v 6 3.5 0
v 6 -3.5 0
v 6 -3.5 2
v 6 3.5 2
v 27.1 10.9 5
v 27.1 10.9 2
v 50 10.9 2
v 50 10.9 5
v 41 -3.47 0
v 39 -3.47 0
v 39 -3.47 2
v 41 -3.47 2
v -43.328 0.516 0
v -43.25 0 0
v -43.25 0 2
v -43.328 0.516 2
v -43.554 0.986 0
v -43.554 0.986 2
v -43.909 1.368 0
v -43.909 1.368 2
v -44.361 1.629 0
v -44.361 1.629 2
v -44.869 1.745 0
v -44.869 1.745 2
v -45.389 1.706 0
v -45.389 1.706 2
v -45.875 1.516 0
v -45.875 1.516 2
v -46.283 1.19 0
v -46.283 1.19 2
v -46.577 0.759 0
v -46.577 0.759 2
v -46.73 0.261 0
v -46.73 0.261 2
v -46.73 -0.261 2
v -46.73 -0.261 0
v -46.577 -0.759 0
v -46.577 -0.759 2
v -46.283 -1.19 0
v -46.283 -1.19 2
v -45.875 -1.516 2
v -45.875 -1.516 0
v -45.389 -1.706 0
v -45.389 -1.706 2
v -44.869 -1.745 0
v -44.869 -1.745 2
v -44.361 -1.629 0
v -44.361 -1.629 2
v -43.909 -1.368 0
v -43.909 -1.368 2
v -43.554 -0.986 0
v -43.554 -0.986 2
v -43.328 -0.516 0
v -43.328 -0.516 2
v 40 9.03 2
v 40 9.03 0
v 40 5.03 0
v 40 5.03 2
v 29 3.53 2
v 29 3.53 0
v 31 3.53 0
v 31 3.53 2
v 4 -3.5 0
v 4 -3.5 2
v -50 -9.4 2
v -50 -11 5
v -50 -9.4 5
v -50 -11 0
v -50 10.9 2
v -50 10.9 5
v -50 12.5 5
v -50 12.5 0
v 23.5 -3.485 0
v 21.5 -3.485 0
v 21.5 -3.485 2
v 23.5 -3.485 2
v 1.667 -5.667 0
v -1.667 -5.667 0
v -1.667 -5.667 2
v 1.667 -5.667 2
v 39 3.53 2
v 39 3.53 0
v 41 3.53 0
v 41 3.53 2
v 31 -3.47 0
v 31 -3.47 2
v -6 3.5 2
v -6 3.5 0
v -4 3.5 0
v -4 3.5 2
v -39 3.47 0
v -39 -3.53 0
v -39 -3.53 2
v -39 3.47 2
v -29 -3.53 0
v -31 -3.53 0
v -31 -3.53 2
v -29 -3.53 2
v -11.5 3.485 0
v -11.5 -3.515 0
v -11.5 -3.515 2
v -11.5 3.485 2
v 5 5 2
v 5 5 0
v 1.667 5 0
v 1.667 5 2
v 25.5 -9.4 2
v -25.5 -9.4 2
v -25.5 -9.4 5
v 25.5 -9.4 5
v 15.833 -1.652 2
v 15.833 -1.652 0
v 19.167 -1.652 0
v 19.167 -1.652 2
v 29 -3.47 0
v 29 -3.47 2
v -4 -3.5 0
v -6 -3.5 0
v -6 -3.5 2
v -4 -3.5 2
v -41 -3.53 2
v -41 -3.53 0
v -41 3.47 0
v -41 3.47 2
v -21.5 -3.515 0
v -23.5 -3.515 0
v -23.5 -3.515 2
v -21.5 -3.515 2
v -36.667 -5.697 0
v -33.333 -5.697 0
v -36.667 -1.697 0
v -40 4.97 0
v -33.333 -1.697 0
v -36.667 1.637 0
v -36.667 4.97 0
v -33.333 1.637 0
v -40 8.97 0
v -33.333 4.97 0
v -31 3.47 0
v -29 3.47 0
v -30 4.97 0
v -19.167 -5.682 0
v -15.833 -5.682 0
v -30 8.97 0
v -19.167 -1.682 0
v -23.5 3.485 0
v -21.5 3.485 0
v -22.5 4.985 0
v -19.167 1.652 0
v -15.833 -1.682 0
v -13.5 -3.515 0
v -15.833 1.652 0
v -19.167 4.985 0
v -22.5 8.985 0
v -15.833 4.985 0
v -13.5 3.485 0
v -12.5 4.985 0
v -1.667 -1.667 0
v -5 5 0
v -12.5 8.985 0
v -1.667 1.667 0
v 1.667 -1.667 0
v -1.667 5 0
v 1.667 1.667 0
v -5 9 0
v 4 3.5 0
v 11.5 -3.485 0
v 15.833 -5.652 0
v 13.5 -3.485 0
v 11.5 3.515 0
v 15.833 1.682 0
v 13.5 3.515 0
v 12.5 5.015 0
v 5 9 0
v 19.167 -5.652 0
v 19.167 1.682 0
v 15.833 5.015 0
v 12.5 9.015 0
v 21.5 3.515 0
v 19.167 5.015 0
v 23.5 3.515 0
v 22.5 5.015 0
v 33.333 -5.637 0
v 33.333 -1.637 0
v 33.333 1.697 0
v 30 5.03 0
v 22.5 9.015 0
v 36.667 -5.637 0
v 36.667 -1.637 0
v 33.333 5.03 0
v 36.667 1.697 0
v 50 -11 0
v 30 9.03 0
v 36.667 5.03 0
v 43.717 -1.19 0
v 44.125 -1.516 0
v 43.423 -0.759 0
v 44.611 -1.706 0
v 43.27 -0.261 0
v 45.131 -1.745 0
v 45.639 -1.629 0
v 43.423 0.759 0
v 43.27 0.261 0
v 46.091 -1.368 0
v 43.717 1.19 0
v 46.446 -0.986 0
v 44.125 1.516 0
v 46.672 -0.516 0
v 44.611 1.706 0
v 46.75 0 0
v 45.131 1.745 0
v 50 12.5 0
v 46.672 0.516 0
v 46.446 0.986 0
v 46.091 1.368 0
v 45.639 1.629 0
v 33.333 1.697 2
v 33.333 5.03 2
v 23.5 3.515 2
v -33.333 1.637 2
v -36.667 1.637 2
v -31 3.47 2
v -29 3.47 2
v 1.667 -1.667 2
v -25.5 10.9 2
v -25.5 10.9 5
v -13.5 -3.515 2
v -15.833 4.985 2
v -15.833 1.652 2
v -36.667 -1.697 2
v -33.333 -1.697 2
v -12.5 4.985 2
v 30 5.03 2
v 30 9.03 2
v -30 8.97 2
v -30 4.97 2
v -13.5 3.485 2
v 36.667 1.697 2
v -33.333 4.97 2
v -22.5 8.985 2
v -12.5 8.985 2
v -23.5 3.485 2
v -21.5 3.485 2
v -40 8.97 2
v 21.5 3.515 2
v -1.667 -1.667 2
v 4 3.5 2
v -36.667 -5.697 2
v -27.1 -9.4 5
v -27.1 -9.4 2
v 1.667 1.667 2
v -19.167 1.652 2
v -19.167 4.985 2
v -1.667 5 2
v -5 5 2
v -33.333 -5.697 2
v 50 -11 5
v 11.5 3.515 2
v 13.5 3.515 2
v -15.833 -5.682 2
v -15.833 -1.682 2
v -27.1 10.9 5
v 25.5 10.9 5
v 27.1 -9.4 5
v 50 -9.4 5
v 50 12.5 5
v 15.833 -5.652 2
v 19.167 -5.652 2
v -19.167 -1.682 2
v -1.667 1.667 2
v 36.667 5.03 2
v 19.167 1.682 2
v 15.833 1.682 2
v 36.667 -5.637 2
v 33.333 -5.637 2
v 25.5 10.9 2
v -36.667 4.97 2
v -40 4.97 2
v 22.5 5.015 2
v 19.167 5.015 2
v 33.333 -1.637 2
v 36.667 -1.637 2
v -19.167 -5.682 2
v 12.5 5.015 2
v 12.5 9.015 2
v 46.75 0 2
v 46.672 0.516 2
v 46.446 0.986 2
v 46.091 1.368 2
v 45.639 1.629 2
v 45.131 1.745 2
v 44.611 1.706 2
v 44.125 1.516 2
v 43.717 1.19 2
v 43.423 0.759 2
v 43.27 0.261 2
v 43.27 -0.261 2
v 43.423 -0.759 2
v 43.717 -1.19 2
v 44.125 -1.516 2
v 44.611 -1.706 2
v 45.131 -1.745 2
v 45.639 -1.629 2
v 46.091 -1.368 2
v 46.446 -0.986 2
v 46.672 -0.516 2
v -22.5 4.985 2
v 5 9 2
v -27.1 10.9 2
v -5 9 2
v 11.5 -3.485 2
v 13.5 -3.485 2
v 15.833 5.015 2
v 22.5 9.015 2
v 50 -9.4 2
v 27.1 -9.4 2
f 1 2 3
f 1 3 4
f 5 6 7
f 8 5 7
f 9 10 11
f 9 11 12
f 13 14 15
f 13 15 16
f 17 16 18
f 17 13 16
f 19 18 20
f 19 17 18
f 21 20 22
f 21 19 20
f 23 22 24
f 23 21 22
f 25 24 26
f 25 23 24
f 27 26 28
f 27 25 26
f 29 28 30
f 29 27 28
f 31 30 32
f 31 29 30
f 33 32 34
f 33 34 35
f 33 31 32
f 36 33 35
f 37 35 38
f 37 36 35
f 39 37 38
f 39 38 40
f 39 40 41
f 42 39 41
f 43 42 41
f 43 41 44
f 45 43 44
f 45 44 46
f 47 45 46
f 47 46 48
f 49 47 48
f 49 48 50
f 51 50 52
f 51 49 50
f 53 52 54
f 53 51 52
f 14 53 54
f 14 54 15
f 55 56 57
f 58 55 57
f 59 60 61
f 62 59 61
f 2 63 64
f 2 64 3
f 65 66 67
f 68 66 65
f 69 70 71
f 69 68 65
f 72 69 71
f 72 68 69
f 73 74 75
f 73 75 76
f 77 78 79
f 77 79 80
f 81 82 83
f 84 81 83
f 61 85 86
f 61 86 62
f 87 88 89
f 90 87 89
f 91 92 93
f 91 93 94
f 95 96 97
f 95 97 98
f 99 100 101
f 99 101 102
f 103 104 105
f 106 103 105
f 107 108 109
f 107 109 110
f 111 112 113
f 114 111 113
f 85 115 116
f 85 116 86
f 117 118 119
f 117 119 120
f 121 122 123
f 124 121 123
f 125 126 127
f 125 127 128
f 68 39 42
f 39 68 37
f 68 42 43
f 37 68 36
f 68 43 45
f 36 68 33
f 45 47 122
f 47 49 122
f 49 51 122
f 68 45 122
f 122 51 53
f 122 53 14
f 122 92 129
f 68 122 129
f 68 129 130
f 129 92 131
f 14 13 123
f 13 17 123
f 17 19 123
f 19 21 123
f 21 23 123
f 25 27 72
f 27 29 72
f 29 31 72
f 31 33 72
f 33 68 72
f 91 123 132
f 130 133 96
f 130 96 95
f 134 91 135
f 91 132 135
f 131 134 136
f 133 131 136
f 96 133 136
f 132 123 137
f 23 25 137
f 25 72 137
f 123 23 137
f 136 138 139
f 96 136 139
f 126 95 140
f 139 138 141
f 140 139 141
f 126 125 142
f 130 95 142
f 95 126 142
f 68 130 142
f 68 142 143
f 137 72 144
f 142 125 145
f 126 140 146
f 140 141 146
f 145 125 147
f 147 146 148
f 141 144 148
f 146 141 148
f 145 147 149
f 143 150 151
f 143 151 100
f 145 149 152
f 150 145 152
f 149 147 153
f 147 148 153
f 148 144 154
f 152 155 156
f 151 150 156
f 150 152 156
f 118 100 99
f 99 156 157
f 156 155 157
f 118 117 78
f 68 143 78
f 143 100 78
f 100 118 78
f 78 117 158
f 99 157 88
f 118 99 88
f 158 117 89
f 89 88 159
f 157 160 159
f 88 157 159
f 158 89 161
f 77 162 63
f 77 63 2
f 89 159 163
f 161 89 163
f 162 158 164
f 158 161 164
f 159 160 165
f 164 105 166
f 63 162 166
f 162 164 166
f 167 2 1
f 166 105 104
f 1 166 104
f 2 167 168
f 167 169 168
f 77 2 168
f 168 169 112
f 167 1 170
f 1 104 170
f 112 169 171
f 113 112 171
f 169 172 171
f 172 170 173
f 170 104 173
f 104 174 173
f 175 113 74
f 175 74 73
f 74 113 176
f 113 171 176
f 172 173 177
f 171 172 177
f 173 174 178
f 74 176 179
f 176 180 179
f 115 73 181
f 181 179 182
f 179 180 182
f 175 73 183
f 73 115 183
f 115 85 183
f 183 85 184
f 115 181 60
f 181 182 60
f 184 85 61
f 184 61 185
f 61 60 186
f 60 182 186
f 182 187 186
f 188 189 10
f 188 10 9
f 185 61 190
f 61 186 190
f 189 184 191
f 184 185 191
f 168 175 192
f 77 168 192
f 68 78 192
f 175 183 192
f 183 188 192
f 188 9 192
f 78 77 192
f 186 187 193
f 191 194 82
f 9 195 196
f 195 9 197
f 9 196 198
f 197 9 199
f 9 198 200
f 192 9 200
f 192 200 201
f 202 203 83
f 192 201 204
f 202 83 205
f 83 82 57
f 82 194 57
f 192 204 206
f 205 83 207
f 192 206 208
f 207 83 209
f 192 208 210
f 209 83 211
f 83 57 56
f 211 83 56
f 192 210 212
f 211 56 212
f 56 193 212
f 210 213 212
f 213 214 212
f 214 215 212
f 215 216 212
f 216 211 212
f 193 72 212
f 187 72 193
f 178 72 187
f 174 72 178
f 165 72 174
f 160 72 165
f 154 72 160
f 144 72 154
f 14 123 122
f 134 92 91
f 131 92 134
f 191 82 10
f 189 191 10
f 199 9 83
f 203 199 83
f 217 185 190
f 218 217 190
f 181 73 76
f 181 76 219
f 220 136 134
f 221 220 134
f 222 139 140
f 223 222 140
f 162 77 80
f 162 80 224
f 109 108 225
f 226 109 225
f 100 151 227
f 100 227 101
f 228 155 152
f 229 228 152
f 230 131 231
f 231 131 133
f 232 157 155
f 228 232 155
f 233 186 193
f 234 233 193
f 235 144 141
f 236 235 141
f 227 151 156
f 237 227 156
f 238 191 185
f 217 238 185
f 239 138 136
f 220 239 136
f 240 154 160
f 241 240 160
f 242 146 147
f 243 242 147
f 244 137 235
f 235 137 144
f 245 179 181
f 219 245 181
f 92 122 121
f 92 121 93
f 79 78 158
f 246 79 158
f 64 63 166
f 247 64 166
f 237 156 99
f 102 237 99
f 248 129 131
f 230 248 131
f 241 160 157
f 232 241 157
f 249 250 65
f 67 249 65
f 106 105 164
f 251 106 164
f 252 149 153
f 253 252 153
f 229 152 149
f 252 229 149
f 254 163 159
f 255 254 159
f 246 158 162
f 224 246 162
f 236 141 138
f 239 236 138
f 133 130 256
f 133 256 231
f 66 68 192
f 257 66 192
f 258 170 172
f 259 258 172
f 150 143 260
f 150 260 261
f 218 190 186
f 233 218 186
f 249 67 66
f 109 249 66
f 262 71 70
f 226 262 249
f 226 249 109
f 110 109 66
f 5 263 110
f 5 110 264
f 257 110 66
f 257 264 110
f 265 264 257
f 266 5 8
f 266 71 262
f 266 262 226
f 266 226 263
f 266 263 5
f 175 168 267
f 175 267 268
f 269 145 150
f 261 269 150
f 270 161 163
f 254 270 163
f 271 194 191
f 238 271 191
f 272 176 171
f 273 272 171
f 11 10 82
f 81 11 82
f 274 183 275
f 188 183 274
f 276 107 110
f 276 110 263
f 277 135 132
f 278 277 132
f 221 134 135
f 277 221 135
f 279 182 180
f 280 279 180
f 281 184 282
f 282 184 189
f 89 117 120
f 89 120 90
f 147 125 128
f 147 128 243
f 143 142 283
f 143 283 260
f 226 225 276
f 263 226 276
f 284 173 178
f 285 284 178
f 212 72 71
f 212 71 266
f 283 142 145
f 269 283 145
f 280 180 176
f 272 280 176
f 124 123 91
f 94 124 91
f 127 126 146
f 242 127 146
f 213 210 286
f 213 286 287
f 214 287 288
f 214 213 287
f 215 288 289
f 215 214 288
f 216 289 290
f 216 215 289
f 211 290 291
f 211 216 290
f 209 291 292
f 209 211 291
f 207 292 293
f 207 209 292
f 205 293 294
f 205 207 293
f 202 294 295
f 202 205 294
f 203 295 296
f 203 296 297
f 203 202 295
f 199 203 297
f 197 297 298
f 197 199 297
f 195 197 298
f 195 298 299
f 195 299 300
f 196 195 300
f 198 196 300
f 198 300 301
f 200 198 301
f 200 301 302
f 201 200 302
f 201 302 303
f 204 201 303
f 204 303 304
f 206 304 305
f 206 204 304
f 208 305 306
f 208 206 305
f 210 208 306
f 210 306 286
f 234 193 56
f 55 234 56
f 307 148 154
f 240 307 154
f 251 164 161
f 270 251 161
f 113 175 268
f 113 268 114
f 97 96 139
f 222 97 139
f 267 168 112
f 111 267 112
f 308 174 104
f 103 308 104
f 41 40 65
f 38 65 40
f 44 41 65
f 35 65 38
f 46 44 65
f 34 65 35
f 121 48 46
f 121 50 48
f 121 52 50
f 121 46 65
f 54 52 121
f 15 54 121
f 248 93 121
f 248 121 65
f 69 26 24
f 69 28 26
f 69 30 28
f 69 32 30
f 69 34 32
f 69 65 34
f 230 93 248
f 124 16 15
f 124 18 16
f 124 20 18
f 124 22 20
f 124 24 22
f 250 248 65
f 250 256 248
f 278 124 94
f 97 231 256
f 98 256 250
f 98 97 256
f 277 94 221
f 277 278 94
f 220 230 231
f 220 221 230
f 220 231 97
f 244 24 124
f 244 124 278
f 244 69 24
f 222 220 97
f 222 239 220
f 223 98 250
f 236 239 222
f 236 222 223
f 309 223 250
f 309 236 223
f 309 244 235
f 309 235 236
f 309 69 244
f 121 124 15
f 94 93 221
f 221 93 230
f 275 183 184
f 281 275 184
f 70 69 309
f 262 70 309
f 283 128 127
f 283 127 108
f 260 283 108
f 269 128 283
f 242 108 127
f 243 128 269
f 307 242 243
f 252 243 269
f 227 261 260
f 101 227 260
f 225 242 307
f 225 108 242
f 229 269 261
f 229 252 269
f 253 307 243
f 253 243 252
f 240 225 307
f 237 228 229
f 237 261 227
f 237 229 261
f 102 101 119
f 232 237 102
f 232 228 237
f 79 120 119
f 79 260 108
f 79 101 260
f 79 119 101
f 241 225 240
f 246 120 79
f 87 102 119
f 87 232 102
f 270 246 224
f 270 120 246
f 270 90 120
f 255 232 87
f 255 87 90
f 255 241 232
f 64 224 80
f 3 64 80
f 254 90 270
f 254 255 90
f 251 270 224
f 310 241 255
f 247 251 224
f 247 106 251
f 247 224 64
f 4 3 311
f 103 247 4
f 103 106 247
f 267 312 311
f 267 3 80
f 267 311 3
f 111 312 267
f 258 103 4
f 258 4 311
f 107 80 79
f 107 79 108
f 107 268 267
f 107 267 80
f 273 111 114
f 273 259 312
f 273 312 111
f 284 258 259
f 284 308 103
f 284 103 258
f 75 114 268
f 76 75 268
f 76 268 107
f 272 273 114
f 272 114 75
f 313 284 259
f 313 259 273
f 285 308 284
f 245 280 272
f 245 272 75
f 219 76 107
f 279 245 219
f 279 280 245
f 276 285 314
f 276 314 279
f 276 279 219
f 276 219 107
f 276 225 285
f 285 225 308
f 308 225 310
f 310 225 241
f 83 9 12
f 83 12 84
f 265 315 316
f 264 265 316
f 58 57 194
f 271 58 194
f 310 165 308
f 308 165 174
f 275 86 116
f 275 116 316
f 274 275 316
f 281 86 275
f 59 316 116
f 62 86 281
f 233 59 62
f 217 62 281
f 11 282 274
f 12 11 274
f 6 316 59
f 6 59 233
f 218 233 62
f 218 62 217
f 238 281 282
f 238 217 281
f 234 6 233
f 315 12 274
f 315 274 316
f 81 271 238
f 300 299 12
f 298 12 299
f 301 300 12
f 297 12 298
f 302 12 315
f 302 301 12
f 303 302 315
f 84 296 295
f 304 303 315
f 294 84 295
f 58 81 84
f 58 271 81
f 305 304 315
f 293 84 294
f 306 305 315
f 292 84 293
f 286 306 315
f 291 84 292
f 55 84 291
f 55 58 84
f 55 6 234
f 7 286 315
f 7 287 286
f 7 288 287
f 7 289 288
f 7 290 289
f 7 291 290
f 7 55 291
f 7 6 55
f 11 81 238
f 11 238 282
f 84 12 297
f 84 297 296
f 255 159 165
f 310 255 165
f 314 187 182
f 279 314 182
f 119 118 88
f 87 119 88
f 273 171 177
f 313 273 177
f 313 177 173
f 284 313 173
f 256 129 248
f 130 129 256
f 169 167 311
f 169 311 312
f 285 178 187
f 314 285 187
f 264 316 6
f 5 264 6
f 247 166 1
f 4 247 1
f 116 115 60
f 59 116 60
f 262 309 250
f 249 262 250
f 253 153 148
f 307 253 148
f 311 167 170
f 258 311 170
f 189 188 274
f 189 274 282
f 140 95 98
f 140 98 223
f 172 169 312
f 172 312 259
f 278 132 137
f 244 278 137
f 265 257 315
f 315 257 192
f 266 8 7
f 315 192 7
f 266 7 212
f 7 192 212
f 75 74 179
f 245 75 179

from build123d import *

# Parameters (mm, degrees)
SKETCH_W     = 100
SKETCH_H     = 23.5
SKETCH_R     = 1.75
SKETCH_W_2   = 2
SKETCH_H_2   = 7
SKETCH_W_3   = 3.333334
SKETCH_H_3   = 4
SKETCH_W_4   = 3.333333
PAD_DEPTH    = 2
SKETCH001_W  = 51
SKETCH001_H  = 20.3
PAD001_DEPTH = 5


with BuildPart() as part:
    # Sketch → Pad (new body)
    with BuildSketch(Plane.XY):
        with Locations((0, 0.75)):
            Rectangle(SKETCH_W, SKETCH_H)
        with Locations((-45, 0)):
            Circle(SKETCH_R, mode=Mode.SUBTRACT)
        with Locations((45, 0)):
            Circle(SKETCH_R, mode=Mode.SUBTRACT)
        Polygon((-39.999987, 8.970025), (-29.999987, 8.970025), (-29.999987, 4.970025), (-33.33332, 4.970025), (-33.33332, 1.636691), (-36.666654, 1.636691), (-36.666654, 4.970025), (-39.999987, 4.970025), align=None, mode=Mode.SUBTRACT)
        with Locations((-39.999987, -0.029975)):
            Rectangle(SKETCH_W_2, SKETCH_H_2, mode=Mode.SUBTRACT)
        with Locations((-29.999987, -0.029975)):
            Rectangle(SKETCH_W_2, SKETCH_H_2, mode=Mode.SUBTRACT)
        Polygon((-22.499994, 8.985012), (-12.499994, 8.985012), (-12.499994, 4.985012), (-15.833327, 4.985012), (-15.833327, 1.651679), (-19.16666, 1.651679), (-19.16666, 4.985012), (-22.499994, 4.985012), align=None, mode=Mode.SUBTRACT)
        with Locations((-22.499994, -0.014988)):
            Rectangle(SKETCH_W_2, SKETCH_H_2, mode=Mode.SUBTRACT)
        with Locations((-12.499994, -0.014988)):
            Rectangle(SKETCH_W_2, SKETCH_H_2, mode=Mode.SUBTRACT)
        Polygon((-5, 9), (5, 9), (5, 5), (1.666667, 5), (1.666667, 1.666667), (-1.666667, 1.666667), (-1.666667, 5), (-5, 5), align=None, mode=Mode.SUBTRACT)
        with Locations((-5, 0)):
            Rectangle(SKETCH_W_2, SKETCH_H_2, mode=Mode.SUBTRACT)
        with Locations((5, 0)):
            Rectangle(SKETCH_W_2, SKETCH_H_2, mode=Mode.SUBTRACT)
        Polygon((12.499994, 9.014988), (22.499994, 9.014988), (22.499994, 5.014988), (19.16666, 5.014988), (19.16666, 1.681654), (15.833327, 1.681654), (15.833327, 5.014988), (12.499994, 5.014988), align=None, mode=Mode.SUBTRACT)
        with Locations((12.499994, 0.014988)):
            Rectangle(SKETCH_W_2, SKETCH_H_2, mode=Mode.SUBTRACT)
        with Locations((22.499994, 0.014988)):
            Rectangle(SKETCH_W_2, SKETCH_H_2, mode=Mode.SUBTRACT)
        Polygon((29.999987, 9.029975), (39.999987, 9.029975), (39.999987, 5.029975), (36.666654, 5.029975), (36.666654, 1.696642), (33.33332, 1.696642), (33.33332, 5.029975), (29.999987, 5.029975), align=None, mode=Mode.SUBTRACT)
        with Locations((29.999987, 0.029975)):
            Rectangle(SKETCH_W_2, SKETCH_H_2, mode=Mode.SUBTRACT)
        with Locations((39.999987, 0.029975)):
            Rectangle(SKETCH_W_2, SKETCH_H_2, mode=Mode.SUBTRACT)
        with Locations((34.999987, -3.636691)):
            Rectangle(SKETCH_W_3, SKETCH_H_3, mode=Mode.SUBTRACT)
        with Locations((-34.999987, -3.696642)):
            Rectangle(SKETCH_W_3, SKETCH_H_3, mode=Mode.SUBTRACT)
        with Locations((-17.499993, -3.681654)):
            Rectangle(SKETCH_W_4, SKETCH_H_3, mode=Mode.SUBTRACT)
        with Locations((0, -3.666667)):
            Rectangle(SKETCH_W_3, SKETCH_H_3, mode=Mode.SUBTRACT)
        with Locations((17.499993, -3.651679)):
            Rectangle(SKETCH_W_4, SKETCH_H_3, mode=Mode.SUBTRACT)
    extrude(amount=PAD_DEPTH)

    # Sketch001 → Pad001 (join)
    with BuildSketch(Plane.XY):
        Polygon((-50, 12.5), (-50, 10.9), (-27.1, 10.9), (-27.1, -9.4), (-50, -9.4), (-50, -11), (50, -11), (50, -9.4), (27.1, -9.4), (27.1, 10.9), (50, 10.9), (50, 12.5), align=None)
        with Locations((0, 0.75)):
            Rectangle(SKETCH001_W, SKETCH001_H, mode=Mode.SUBTRACT)
    extrude(amount=PAD001_DEPTH)


solid = part.part
